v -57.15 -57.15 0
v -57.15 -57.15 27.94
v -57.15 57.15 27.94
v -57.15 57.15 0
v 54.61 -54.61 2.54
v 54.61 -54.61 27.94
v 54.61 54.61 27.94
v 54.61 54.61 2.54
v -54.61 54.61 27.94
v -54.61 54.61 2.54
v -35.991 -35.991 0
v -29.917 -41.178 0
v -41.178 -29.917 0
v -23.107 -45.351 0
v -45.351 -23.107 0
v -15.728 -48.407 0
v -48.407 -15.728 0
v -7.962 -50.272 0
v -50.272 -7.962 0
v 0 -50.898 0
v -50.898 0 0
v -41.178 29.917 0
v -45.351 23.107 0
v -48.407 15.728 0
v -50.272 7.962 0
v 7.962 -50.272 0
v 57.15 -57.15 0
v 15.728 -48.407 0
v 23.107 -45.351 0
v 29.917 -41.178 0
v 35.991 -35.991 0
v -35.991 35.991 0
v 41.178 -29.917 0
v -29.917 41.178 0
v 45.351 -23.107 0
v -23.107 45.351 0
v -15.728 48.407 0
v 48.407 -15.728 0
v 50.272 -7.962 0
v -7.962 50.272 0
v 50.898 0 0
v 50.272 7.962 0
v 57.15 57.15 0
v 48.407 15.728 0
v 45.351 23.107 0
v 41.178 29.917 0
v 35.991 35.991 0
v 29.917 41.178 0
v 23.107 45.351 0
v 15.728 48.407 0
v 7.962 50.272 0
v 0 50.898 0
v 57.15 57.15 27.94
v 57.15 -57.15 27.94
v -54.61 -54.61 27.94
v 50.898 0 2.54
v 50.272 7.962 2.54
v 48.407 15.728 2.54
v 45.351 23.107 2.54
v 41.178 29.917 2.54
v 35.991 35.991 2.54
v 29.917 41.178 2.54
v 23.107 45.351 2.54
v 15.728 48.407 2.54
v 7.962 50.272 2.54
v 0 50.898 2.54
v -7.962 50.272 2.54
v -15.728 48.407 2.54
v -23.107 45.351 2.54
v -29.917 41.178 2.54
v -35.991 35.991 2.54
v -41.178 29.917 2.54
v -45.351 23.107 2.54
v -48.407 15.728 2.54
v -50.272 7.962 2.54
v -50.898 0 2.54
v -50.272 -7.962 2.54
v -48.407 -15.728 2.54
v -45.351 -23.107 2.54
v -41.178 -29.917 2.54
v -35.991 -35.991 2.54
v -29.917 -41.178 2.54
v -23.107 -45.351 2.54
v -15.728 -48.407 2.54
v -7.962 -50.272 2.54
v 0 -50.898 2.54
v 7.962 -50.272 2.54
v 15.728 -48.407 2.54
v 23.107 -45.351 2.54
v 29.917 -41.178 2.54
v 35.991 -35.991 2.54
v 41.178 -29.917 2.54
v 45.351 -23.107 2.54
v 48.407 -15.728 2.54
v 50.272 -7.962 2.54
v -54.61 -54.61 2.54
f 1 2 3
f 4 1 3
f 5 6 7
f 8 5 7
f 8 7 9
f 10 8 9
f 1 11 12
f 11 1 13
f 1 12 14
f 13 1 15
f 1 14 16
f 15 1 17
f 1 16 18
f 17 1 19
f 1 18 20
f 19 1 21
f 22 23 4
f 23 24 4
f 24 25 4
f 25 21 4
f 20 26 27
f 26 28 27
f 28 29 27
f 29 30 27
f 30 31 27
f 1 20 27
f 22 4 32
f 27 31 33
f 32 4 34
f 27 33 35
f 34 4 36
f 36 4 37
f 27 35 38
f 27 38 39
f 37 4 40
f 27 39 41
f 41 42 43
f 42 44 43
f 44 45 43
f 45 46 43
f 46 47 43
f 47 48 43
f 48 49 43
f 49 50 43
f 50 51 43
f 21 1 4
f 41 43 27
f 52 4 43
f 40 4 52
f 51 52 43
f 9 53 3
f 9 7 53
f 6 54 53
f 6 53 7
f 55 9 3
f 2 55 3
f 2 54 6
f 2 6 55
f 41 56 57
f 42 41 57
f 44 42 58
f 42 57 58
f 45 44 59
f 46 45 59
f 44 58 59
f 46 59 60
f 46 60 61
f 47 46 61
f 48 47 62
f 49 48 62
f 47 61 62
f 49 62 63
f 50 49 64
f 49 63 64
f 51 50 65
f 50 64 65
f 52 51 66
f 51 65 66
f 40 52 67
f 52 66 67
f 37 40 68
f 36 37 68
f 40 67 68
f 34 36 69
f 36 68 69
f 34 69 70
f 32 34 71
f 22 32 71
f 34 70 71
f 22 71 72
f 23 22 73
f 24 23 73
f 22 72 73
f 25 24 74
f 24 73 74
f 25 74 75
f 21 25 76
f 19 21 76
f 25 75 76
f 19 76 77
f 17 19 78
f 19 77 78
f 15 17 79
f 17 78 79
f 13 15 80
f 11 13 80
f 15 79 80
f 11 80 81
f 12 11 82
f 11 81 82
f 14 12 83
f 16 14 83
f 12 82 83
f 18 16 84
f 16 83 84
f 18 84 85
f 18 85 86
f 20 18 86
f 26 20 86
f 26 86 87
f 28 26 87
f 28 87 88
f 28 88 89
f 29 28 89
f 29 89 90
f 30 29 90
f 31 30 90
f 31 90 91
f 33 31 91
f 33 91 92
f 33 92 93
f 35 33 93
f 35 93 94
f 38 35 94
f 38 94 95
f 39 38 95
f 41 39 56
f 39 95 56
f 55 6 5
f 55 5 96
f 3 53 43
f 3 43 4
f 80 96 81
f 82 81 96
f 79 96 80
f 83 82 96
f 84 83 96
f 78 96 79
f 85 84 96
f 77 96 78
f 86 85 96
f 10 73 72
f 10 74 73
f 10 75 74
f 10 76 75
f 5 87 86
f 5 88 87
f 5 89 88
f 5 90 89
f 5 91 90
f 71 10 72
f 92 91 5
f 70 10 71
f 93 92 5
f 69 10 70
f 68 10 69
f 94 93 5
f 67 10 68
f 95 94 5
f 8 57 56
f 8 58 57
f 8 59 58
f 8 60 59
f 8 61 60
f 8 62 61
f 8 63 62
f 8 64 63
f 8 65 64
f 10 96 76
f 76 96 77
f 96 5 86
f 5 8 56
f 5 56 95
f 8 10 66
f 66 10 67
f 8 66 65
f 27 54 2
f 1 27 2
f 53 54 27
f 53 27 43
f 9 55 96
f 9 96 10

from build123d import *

# Parameters (mm, degrees)
F0_W      = 114.3
F0_H      = 114.3
F1_DEPTH  = 2.54
F2_W      = 114.3
F2_H      = 25.4
F3_DEPTH  = 2.54
F5_W      = 109.22
F5_H      = 25.4
F6_DEPTH  = 2.54
F8_W      = 114.3
F8_H      = 114.3
F8_W_2    = 109.22
F8_H_2    = 109.22
F9_DEPTH  = 2.54
F10_W     = 114.3
F10_H     = 114.3
F11_DEPTH = 2.54
F12_W     = 76.2
F12_H     = 104.14
F13_DEPTH = 1.27
F14_R     = 6.35
F15_DEPTH = 1.27
F17_R     = 50.8982940966
F18_DEPTH = 2.54


with BuildPart() as f1:
    # F0 (on Top) → F1 (new body)
    with BuildSketch(Plane.XY):
        Rectangle(F0_W, F0_H)
    extrude(amount=F1_DEPTH)

    # F4: F3 across plane


with BuildPart() as f3:
    # F2 (on face) → F3 (new body)
    with BuildSketch(Plane.YZ.offset(57.15)):
        with Locations((0, 15.24)):
            Rectangle(F2_W, F2_H)
    extrude(amount=-F3_DEPTH)


with BuildPart() as f1_1:
    add(f1.part)
    add(f3.part.mirror(Plane.YZ))



with BuildPart() as f6:
    # F5 (on face) → F6 (new body)
    with BuildSketch(Plane(origin=(0, 57.15, 0), x_dir=(-1, 0, 0), z_dir=(0, 1, 0))):
        with Locations((0, 15.24)):
            Rectangle(F5_W, F5_H)
    extrude(amount=-F6_DEPTH)


with BuildPart() as f1_2:
    add(f1_1.part)

    add(f3.part)  # F7 merges F3

    add(f6.part)  # F7 merges F6
    # F7: F6 across plane
    add(f6.part.mirror(Plane.XZ))

    # F17 (on face) → F18 (cut, through all)
    with BuildSketch(Plane.XY.offset(2.54)):
        Circle(F17_R)
    extrude(amount=-F18_DEPTH, mode=Mode.SUBTRACT)


with BuildPart() as f9:
    # F8 (on face) → F9 (new body)
    with BuildSketch(Plane.XY.offset(27.94)):
        Rectangle(F8_W, F8_H)
        Rectangle(F8_W_2, F8_H_2, mode=Mode.SUBTRACT)
        Rectangle(F8_W_2, F8_H_2)
    extrude(amount=F9_DEPTH)

    # F10 (on face) → F11 (join)
    with BuildSketch(Plane.XY.offset(30.48)):
        Rectangle(F10_W, F10_H)
    extrude(amount=F11_DEPTH)

    # F12 (on face) → F13 (cut)
    with BuildSketch(Plane.XY.offset(33.02)):
        with Locations((-13.97, 0)):
            Rectangle(F12_W, F12_H)
    extrude(amount=-F13_DEPTH, mode=Mode.SUBTRACT)

    # F14 (on face) → F15 (cut)
    with BuildSketch(Plane.XY.offset(33.02)):
        with BuildLine():
            ThreePointArc((55.245, 45.72), (48.895, 52.07), (42.545, 45.72))
            ThreePointArc((42.545, 45.72), (48.895, 39.37), (55.245, 45.72))
        make_face()
        with Locations((32.385, 45.72)):
            Circle(F14_R)
        with BuildLine():
            ThreePointArc((40.64, 6.35), (36.1498719395, -4.4901280605), (46.99, 0))
            ThreePointArc((46.99, 0), (45.1301280605, 4.4901280605), (40.64, 6.35))
        make_face()
    extrude(amount=-F15_DEPTH, mode=Mode.SUBTRACT)


solid = f1_2.part
